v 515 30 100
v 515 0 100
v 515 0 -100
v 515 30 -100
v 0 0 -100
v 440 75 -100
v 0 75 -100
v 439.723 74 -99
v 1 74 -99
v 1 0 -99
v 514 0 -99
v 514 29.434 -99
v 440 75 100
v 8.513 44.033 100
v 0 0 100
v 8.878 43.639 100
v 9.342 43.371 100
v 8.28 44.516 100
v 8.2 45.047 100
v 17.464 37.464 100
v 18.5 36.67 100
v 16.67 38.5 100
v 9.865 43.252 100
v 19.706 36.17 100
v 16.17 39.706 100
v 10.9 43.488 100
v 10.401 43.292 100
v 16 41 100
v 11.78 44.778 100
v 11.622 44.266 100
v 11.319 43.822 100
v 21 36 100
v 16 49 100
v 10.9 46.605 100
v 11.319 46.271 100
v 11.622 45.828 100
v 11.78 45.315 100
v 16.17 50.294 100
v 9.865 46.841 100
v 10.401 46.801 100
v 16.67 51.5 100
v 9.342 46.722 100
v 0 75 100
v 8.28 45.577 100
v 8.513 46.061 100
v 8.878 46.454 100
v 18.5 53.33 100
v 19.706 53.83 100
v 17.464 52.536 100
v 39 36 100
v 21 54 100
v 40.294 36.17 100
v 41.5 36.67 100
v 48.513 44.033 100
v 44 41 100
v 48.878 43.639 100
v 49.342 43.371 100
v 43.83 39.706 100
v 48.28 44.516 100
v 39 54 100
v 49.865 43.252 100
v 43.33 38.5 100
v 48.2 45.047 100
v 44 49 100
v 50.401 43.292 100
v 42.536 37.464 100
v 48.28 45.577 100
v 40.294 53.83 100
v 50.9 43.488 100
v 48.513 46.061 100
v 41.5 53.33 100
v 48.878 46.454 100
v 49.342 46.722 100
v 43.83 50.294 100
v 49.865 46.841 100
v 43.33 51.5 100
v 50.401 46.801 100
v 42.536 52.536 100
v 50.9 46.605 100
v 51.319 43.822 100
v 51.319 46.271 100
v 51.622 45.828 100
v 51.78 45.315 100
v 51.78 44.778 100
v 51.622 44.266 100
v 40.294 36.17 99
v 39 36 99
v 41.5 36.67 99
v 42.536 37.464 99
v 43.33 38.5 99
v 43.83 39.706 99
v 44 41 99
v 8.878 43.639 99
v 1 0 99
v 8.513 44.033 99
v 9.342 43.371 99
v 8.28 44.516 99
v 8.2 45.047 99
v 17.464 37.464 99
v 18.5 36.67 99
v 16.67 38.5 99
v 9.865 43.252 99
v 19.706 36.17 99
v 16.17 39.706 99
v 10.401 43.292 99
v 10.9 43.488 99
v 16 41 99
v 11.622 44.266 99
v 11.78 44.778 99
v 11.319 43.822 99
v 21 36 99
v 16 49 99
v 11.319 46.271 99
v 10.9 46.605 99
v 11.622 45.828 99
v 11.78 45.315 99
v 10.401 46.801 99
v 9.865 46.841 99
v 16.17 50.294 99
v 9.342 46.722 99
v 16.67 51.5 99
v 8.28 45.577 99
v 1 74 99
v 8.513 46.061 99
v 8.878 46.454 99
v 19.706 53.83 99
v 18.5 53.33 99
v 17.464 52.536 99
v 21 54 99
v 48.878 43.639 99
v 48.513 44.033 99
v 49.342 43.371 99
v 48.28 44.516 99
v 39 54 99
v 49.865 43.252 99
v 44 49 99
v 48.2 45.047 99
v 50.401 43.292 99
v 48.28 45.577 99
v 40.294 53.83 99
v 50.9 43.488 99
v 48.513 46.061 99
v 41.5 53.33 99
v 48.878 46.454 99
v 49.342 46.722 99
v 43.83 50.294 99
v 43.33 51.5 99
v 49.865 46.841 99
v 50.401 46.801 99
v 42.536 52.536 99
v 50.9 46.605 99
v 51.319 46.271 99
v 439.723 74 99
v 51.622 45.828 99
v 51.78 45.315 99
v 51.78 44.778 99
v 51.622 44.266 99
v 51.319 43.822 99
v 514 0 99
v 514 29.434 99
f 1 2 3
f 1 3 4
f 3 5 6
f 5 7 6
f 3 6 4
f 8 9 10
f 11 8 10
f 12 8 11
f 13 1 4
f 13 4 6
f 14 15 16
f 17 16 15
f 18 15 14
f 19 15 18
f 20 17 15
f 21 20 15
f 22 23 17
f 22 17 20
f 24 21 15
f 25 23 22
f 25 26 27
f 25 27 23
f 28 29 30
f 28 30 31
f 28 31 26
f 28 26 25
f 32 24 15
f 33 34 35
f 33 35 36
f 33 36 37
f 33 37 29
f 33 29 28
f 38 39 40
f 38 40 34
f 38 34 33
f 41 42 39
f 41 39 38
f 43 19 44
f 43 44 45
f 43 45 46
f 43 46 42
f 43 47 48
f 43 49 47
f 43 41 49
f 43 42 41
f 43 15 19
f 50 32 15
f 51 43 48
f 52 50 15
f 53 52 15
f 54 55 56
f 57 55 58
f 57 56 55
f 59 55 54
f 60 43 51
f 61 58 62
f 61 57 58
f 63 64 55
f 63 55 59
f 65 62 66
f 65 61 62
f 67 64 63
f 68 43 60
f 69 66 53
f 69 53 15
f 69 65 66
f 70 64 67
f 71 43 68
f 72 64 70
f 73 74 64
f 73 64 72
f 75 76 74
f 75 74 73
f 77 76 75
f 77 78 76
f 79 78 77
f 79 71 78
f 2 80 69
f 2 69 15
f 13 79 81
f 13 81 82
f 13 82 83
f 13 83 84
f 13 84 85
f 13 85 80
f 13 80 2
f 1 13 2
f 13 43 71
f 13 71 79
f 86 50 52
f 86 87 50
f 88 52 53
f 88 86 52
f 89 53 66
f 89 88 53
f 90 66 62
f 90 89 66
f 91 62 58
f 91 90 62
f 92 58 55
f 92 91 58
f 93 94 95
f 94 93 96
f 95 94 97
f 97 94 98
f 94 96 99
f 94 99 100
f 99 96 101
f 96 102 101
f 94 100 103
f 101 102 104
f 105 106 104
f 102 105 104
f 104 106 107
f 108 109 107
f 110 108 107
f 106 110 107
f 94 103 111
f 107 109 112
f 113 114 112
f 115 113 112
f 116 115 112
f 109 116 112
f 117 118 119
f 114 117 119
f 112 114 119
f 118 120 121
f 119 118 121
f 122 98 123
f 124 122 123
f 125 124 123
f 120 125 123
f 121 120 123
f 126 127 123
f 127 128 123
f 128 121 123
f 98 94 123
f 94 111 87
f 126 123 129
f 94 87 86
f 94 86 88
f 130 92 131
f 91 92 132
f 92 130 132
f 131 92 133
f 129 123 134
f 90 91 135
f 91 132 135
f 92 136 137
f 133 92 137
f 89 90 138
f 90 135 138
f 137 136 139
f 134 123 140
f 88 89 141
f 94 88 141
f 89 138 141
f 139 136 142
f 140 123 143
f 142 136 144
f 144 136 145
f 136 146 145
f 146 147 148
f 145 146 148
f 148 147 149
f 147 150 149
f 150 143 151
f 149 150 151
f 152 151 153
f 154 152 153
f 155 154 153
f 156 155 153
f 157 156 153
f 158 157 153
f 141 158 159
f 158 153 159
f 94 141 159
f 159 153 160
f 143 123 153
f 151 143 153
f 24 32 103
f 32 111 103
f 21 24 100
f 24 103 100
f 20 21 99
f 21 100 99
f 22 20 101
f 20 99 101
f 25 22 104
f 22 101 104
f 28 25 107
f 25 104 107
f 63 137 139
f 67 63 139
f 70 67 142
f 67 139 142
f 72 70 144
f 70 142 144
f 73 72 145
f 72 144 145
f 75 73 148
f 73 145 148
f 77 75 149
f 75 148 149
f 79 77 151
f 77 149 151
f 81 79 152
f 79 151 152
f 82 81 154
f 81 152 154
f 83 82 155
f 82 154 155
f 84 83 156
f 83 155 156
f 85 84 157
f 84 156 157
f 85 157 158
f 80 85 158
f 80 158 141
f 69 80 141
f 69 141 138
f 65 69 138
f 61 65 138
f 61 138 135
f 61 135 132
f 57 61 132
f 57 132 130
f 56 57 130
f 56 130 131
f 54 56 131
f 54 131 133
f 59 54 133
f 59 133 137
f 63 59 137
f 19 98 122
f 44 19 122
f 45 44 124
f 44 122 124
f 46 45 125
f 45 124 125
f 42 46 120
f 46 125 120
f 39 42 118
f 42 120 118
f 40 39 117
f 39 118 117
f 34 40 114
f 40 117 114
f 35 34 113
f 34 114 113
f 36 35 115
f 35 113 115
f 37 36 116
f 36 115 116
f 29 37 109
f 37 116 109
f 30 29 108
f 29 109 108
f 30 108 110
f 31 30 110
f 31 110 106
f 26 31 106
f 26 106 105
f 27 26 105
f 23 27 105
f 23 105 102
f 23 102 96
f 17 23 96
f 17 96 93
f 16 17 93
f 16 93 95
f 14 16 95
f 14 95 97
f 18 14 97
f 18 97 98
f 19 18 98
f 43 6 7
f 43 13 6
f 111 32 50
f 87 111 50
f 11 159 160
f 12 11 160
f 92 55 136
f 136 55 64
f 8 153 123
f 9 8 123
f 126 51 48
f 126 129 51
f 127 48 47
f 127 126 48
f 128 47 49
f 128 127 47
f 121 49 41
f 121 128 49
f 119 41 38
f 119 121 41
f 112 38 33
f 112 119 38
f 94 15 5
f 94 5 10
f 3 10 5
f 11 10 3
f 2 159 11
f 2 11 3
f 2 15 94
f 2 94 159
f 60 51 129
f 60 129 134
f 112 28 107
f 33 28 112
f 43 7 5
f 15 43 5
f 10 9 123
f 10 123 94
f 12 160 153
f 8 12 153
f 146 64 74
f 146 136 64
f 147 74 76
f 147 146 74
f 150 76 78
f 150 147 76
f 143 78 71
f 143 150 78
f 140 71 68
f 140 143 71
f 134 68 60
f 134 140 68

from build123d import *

# Parameters (mm, degrees)
BOSS_EXTRUDE1_DEPTH      = 100
SHELL1_T                 = -1
SKETCH2_W                = 28
SKETCH2_H                = 18
CUT_EXTRUDE1_DEPTH       = 1
FILLET1_R                = 5
M3_CLEARANCE_HOLE1_D     = 3.6
M3_CLEARANCE_HOLE1_DEPTH = 10
M3_CLEARANCE_HOLE1_TIP   = 1.081549114


with BuildPart() as part:
    # Sketch1 → Boss-Extrude1 (new, symmetric)
    with BuildSketch(Plane.XY):
        Polygon((0, 0), (515, 0), (515, 30), (440, 75), (0, 75), align=None)
    extrude(amount=BOSS_EXTRUDE1_DEPTH, both=True)

    # Shell1
    shell1_openings = [part.faces().sort_by_distance(p)[0] for p in [
        (257.5, 0, 0),
    ]]
    offset(amount=SHELL1_T, openings=shell1_openings, kind=Kind.INTERSECTION)

    # Sketch2 → Cut-Extrude1 (cut)
    with BuildSketch(Plane.XY.offset(100)):
        with Locations((30, 45)):
            Rectangle(SKETCH2_W, SKETCH2_H)
    extrude(amount=-CUT_EXTRUDE1_DEPTH, mode=Mode.SUBTRACT)

    # Fillet1
    fillet1_edges = [part.edges().sort_by_distance(p)[0] for p in [
        (16, 36, 99.5),
        (16, 54, 99.5),
        (44, 54, 99.5),
        (44, 36, 99.5),
    ]]
    fillet(fillet1_edges, radius=FILLET1_R)

    # M3 Clearance Hole1
    with Locations(Plane.XY.offset(100)):
        with Locations((10, 45.046525162), (50, 45.046525162)):
            Hole(M3_CLEARANCE_HOLE1_D / 2, depth=M3_CLEARANCE_HOLE1_DEPTH)
            with Locations((0, 0, -(M3_CLEARANCE_HOLE1_DEPTH + M3_CLEARANCE_HOLE1_TIP / 2))):  # 118° drill point
                Cone(0, M3_CLEARANCE_HOLE1_D / 2, M3_CLEARANCE_HOLE1_TIP, mode=Mode.SUBTRACT)


solid = part.part
